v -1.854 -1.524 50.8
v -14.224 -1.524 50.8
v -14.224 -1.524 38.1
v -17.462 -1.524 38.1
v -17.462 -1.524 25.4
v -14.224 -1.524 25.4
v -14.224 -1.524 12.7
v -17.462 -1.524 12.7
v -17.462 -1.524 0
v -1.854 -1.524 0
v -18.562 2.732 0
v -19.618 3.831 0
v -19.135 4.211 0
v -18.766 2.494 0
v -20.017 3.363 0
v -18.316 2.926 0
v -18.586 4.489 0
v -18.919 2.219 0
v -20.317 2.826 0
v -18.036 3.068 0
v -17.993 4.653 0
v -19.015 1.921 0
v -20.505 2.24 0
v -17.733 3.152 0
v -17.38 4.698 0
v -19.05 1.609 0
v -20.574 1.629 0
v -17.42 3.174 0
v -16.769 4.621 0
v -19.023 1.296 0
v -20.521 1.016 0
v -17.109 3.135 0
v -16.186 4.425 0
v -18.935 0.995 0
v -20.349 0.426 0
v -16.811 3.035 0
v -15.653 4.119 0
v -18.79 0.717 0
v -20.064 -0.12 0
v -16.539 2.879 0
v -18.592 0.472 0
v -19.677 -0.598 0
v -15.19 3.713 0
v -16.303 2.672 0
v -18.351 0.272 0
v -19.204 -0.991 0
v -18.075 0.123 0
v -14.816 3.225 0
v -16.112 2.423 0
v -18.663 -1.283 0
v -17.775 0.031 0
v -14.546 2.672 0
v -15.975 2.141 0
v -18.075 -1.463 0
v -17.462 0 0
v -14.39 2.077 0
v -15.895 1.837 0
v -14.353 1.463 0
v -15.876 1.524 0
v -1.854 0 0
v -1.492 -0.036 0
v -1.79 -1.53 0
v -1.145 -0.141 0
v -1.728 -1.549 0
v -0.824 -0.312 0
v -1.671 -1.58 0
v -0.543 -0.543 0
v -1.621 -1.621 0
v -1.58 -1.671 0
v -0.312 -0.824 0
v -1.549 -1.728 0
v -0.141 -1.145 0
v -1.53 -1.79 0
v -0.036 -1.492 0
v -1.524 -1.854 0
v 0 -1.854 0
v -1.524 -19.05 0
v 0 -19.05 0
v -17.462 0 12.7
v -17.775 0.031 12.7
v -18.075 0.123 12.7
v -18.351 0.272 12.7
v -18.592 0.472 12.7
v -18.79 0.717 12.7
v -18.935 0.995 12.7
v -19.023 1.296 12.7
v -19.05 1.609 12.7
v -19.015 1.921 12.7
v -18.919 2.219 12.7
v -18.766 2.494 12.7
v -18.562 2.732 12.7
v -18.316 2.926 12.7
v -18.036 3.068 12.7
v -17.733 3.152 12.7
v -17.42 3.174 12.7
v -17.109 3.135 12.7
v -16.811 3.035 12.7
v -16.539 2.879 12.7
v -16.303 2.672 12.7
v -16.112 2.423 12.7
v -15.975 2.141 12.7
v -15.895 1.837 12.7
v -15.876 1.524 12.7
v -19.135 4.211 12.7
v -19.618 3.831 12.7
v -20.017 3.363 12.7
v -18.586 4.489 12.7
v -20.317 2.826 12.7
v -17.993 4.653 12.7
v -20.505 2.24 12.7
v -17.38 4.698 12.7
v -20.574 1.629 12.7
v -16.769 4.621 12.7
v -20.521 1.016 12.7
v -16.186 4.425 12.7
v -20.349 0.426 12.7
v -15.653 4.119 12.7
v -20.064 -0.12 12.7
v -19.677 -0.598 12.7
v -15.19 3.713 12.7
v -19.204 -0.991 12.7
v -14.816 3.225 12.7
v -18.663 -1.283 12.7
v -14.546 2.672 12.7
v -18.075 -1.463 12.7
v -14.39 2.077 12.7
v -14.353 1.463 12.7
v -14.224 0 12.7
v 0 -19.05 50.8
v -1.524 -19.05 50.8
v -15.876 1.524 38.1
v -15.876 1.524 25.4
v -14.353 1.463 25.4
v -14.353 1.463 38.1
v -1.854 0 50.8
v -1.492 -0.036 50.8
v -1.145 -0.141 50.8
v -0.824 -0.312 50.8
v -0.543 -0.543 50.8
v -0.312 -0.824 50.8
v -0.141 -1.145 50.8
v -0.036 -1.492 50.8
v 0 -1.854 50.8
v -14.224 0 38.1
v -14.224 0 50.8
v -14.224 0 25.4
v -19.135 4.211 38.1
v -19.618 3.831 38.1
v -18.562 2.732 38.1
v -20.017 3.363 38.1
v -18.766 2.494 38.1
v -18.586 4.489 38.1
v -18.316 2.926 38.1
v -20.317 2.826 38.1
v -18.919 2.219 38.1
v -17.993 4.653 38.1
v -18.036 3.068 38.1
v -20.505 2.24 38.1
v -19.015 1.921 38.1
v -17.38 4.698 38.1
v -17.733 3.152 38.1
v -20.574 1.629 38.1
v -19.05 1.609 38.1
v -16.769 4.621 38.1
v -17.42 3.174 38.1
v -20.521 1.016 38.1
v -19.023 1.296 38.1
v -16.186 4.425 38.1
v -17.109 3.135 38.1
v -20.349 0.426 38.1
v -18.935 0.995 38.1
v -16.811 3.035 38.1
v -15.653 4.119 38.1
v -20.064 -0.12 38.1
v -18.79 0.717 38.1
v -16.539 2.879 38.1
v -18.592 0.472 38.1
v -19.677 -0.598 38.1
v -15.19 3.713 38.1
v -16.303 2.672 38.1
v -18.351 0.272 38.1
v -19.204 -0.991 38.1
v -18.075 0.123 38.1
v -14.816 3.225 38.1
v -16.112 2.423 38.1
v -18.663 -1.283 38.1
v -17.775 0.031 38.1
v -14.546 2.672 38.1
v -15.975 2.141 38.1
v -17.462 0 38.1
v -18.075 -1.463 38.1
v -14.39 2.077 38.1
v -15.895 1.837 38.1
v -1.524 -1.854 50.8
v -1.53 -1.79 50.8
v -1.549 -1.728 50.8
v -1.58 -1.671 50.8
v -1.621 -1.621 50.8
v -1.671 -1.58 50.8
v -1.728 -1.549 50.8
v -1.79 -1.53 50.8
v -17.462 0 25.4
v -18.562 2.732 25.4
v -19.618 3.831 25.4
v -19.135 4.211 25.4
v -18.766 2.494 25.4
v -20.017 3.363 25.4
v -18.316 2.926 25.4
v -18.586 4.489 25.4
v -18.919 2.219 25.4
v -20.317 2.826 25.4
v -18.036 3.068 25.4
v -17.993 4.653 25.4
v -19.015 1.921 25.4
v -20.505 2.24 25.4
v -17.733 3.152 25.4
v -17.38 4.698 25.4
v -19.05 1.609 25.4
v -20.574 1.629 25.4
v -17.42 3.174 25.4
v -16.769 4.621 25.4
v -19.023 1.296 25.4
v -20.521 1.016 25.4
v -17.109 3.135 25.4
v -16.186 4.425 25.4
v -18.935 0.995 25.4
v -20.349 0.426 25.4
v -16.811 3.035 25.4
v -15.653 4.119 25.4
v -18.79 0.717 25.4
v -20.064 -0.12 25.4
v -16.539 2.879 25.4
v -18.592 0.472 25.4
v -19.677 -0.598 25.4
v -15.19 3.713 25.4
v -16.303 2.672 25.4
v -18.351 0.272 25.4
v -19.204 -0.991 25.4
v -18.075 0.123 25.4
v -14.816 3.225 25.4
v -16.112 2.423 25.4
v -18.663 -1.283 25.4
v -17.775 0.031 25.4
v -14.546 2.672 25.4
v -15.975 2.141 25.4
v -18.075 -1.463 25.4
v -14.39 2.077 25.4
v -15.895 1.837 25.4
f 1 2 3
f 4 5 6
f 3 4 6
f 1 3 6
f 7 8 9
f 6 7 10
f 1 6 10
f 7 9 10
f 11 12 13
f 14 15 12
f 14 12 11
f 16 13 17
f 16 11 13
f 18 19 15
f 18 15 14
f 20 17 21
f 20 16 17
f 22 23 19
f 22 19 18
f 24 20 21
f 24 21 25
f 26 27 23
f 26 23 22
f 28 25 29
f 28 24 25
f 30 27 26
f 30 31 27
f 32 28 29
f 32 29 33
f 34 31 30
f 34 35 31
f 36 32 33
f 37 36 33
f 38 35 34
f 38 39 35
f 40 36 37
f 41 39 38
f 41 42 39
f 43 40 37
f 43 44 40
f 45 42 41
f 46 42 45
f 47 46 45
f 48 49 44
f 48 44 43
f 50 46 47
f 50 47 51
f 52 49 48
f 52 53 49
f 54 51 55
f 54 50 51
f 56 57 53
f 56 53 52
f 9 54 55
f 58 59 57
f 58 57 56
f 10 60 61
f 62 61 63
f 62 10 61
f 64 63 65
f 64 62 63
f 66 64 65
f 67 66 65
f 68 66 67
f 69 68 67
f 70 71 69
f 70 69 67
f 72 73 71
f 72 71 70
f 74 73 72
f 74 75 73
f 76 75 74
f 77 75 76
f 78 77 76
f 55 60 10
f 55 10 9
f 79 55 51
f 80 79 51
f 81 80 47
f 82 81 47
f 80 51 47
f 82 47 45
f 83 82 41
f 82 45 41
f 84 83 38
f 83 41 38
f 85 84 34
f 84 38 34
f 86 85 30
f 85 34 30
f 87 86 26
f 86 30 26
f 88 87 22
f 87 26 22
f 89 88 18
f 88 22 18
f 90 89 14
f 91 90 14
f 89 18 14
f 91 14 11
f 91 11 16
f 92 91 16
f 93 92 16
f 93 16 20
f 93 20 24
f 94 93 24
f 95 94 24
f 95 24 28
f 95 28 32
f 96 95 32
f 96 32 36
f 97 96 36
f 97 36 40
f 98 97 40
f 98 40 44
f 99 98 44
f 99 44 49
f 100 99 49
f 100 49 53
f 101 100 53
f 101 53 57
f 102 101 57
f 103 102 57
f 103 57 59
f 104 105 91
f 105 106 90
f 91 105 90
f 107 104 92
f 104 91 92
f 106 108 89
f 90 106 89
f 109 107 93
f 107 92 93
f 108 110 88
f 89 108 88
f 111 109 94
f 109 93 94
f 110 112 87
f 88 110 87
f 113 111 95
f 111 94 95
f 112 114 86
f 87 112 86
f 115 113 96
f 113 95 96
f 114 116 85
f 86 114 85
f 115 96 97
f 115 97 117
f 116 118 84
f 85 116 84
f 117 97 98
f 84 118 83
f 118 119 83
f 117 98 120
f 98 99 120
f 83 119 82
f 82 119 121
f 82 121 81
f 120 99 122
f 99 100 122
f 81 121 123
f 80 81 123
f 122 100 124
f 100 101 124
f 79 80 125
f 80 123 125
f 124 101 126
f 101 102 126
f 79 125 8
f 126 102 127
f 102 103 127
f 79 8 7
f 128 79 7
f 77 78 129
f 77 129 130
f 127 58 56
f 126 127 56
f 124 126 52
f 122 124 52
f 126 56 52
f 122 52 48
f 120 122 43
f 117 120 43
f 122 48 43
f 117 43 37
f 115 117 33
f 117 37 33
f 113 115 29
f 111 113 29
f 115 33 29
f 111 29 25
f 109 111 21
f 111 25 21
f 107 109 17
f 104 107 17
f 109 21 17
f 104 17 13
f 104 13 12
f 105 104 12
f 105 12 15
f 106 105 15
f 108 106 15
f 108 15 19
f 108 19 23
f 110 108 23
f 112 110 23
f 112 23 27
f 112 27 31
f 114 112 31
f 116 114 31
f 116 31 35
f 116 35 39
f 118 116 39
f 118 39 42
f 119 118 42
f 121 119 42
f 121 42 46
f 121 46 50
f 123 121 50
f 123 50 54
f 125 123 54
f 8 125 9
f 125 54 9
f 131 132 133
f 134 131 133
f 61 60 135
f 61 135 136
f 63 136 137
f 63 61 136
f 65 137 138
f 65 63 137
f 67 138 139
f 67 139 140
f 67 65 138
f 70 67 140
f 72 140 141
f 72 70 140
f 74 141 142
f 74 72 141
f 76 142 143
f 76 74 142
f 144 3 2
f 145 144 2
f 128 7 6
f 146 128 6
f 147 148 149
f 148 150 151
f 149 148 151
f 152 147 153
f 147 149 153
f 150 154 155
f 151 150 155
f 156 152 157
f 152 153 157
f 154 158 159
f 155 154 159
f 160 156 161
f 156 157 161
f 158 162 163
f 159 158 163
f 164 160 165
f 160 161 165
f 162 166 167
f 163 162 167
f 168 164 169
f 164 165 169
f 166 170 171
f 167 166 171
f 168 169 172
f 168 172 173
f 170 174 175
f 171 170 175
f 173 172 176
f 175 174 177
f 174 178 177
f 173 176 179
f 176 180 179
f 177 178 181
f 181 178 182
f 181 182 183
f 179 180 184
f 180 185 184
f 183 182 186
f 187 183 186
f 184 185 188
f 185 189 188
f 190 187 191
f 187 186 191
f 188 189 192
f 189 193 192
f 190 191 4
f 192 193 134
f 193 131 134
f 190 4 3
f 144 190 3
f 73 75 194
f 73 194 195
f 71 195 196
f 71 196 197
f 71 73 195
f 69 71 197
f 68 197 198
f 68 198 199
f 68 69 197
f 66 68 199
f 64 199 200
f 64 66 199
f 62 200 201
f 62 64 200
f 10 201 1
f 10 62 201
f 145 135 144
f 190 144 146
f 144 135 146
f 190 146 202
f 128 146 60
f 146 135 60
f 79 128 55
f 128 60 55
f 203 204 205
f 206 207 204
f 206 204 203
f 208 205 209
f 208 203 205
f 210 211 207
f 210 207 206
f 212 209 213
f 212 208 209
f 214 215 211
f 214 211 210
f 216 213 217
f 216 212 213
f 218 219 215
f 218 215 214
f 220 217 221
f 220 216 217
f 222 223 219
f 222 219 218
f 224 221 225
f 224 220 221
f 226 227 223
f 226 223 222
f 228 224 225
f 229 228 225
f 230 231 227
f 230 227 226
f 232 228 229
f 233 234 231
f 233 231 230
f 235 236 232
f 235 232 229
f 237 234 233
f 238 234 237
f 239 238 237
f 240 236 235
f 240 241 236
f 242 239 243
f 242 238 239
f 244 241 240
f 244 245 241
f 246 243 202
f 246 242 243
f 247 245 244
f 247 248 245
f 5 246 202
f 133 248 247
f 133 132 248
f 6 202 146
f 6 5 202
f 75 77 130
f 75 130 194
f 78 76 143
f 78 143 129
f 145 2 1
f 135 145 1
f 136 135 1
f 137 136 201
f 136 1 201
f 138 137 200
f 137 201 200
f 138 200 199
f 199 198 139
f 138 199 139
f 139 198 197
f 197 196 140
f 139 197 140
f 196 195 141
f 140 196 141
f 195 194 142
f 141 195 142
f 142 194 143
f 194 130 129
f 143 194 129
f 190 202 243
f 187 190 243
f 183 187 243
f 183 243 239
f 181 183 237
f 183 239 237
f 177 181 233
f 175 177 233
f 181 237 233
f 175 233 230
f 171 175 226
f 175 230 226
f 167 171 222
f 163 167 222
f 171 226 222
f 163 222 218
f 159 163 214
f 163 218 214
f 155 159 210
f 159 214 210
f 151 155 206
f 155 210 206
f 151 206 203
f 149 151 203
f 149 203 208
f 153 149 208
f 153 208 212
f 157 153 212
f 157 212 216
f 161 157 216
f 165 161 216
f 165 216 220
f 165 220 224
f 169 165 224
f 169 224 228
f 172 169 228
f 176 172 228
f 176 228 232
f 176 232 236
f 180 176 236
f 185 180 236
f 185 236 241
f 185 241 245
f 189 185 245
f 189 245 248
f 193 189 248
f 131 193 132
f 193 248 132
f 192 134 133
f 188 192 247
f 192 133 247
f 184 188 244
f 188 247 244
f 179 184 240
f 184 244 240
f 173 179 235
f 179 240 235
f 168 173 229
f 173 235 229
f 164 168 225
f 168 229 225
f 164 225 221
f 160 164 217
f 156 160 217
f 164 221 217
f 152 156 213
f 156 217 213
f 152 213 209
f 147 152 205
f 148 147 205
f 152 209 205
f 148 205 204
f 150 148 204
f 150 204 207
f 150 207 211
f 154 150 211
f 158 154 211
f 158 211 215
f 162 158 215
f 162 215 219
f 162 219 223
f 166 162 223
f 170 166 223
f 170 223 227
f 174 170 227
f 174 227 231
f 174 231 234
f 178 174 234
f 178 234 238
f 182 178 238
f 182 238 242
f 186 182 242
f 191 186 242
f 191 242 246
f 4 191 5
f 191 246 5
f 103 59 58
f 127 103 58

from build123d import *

# Parameters (mm, degrees)
BRIDA_BASE1_DEPTH                = 50.8
CROQUIS8_W                       = 6.35
CROQUIS8_H                       = 12.7
CORTAR_EXTRUIR2_DEPTH            = 56.160268355
MATRIZL1_COUNT                   = 2
MATRIZL1_PITCH                   = 25.4
BRIDA_DE_ARISTA1_STRIP_W         = 6.7564
BRIDA_DE_ARISTA1_STRIP_H         = 1.524
BRIDA_DE_ARISTA1_STRIP_CUT_DEPTH = 50.8
BRIDA_DE_ARISTA1_DEPTH           = 50.8


# Sheet-metal steps are written as plain solids
with BuildPart() as part:
    # Croquis1 → Brida base1 (new body)
    with BuildSketch(Plane.XY):
        with BuildLine():
            Line((0, 0), (-17.4625, 0))
            ThreePointArc((-17.4625, 0), (-18.562352263, 2.73226253), (-15.876270508, 1.524))
            Line((-15.876270508, 1.524), (-14.353490196, 1.46304))
            ThreePointArc((-14.353490196, 1.46304), (-19.618210435, 3.831234559), (-17.4625, -1.524))
            Line((-17.4625, -1.524), (0, -1.524))
            Line((0, -1.524), (0, 0))
        make_face()
    extrude(amount=BRIDA_BASE1_DEPTH)

    # Croquis8 → Cortar-Extruir2 (cut, through all)
    with BuildSketch(Plane.XZ.offset(1.524)):
        with Locations((-17.399, 44.45)):
            Rectangle(CROQUIS8_W, CROQUIS8_H)
    cortar_extruir2 = extrude(amount=-CORTAR_EXTRUIR2_DEPTH, mode=Mode.SUBTRACT)

    # MatrizL1: Cortar-Extruir2 ×2
    with Locations(*[(0, 0, -i * MATRIZL1_PITCH) for i in range(1, MATRIZL1_COUNT)]):
        add(cortar_extruir2, mode=Mode.SUBTRACT)

    # Brida de arista1 strip (across the edge) → Brida de arista1 strip cut (cut)
    with BuildSketch(Plane(origin=(0, -1.524, 0), x_dir=(-1, 0, 0), z_dir=(0, 0, 1))):
        with Locations((-1.524, -0.762)):
            Rectangle(BRIDA_DE_ARISTA1_STRIP_W, BRIDA_DE_ARISTA1_STRIP_H)
    extrude(amount=BRIDA_DE_ARISTA1_STRIP_CUT_DEPTH, mode=Mode.SUBTRACT)

    # Brida de arista1 section (across the edge) → Brida de arista1 (add)
    with BuildSketch(Plane(origin=(0, -1.524, 0), x_dir=(-1, 0, 0), z_dir=(0, 0, 1))):
        with BuildLine():
            Line((0, 0.3302), (0, 17.526))
            Line((0, 17.526), (1.524, 17.526))
            Line((1.524, 17.526), (1.524, 0.3302))
            ThreePointArc((1.524, 0.3302), (1.620713341, 0.096713341), (1.8542, 0))
            Line((1.8542, 0), (1.8542, -1.524))
            ThreePointArc((1.8542, -1.524), (0.543082606, -0.980917394), (0, 0.3302))
        make_face()
    extrude(amount=BRIDA_DE_ARISTA1_DEPTH)


solid = part.part
